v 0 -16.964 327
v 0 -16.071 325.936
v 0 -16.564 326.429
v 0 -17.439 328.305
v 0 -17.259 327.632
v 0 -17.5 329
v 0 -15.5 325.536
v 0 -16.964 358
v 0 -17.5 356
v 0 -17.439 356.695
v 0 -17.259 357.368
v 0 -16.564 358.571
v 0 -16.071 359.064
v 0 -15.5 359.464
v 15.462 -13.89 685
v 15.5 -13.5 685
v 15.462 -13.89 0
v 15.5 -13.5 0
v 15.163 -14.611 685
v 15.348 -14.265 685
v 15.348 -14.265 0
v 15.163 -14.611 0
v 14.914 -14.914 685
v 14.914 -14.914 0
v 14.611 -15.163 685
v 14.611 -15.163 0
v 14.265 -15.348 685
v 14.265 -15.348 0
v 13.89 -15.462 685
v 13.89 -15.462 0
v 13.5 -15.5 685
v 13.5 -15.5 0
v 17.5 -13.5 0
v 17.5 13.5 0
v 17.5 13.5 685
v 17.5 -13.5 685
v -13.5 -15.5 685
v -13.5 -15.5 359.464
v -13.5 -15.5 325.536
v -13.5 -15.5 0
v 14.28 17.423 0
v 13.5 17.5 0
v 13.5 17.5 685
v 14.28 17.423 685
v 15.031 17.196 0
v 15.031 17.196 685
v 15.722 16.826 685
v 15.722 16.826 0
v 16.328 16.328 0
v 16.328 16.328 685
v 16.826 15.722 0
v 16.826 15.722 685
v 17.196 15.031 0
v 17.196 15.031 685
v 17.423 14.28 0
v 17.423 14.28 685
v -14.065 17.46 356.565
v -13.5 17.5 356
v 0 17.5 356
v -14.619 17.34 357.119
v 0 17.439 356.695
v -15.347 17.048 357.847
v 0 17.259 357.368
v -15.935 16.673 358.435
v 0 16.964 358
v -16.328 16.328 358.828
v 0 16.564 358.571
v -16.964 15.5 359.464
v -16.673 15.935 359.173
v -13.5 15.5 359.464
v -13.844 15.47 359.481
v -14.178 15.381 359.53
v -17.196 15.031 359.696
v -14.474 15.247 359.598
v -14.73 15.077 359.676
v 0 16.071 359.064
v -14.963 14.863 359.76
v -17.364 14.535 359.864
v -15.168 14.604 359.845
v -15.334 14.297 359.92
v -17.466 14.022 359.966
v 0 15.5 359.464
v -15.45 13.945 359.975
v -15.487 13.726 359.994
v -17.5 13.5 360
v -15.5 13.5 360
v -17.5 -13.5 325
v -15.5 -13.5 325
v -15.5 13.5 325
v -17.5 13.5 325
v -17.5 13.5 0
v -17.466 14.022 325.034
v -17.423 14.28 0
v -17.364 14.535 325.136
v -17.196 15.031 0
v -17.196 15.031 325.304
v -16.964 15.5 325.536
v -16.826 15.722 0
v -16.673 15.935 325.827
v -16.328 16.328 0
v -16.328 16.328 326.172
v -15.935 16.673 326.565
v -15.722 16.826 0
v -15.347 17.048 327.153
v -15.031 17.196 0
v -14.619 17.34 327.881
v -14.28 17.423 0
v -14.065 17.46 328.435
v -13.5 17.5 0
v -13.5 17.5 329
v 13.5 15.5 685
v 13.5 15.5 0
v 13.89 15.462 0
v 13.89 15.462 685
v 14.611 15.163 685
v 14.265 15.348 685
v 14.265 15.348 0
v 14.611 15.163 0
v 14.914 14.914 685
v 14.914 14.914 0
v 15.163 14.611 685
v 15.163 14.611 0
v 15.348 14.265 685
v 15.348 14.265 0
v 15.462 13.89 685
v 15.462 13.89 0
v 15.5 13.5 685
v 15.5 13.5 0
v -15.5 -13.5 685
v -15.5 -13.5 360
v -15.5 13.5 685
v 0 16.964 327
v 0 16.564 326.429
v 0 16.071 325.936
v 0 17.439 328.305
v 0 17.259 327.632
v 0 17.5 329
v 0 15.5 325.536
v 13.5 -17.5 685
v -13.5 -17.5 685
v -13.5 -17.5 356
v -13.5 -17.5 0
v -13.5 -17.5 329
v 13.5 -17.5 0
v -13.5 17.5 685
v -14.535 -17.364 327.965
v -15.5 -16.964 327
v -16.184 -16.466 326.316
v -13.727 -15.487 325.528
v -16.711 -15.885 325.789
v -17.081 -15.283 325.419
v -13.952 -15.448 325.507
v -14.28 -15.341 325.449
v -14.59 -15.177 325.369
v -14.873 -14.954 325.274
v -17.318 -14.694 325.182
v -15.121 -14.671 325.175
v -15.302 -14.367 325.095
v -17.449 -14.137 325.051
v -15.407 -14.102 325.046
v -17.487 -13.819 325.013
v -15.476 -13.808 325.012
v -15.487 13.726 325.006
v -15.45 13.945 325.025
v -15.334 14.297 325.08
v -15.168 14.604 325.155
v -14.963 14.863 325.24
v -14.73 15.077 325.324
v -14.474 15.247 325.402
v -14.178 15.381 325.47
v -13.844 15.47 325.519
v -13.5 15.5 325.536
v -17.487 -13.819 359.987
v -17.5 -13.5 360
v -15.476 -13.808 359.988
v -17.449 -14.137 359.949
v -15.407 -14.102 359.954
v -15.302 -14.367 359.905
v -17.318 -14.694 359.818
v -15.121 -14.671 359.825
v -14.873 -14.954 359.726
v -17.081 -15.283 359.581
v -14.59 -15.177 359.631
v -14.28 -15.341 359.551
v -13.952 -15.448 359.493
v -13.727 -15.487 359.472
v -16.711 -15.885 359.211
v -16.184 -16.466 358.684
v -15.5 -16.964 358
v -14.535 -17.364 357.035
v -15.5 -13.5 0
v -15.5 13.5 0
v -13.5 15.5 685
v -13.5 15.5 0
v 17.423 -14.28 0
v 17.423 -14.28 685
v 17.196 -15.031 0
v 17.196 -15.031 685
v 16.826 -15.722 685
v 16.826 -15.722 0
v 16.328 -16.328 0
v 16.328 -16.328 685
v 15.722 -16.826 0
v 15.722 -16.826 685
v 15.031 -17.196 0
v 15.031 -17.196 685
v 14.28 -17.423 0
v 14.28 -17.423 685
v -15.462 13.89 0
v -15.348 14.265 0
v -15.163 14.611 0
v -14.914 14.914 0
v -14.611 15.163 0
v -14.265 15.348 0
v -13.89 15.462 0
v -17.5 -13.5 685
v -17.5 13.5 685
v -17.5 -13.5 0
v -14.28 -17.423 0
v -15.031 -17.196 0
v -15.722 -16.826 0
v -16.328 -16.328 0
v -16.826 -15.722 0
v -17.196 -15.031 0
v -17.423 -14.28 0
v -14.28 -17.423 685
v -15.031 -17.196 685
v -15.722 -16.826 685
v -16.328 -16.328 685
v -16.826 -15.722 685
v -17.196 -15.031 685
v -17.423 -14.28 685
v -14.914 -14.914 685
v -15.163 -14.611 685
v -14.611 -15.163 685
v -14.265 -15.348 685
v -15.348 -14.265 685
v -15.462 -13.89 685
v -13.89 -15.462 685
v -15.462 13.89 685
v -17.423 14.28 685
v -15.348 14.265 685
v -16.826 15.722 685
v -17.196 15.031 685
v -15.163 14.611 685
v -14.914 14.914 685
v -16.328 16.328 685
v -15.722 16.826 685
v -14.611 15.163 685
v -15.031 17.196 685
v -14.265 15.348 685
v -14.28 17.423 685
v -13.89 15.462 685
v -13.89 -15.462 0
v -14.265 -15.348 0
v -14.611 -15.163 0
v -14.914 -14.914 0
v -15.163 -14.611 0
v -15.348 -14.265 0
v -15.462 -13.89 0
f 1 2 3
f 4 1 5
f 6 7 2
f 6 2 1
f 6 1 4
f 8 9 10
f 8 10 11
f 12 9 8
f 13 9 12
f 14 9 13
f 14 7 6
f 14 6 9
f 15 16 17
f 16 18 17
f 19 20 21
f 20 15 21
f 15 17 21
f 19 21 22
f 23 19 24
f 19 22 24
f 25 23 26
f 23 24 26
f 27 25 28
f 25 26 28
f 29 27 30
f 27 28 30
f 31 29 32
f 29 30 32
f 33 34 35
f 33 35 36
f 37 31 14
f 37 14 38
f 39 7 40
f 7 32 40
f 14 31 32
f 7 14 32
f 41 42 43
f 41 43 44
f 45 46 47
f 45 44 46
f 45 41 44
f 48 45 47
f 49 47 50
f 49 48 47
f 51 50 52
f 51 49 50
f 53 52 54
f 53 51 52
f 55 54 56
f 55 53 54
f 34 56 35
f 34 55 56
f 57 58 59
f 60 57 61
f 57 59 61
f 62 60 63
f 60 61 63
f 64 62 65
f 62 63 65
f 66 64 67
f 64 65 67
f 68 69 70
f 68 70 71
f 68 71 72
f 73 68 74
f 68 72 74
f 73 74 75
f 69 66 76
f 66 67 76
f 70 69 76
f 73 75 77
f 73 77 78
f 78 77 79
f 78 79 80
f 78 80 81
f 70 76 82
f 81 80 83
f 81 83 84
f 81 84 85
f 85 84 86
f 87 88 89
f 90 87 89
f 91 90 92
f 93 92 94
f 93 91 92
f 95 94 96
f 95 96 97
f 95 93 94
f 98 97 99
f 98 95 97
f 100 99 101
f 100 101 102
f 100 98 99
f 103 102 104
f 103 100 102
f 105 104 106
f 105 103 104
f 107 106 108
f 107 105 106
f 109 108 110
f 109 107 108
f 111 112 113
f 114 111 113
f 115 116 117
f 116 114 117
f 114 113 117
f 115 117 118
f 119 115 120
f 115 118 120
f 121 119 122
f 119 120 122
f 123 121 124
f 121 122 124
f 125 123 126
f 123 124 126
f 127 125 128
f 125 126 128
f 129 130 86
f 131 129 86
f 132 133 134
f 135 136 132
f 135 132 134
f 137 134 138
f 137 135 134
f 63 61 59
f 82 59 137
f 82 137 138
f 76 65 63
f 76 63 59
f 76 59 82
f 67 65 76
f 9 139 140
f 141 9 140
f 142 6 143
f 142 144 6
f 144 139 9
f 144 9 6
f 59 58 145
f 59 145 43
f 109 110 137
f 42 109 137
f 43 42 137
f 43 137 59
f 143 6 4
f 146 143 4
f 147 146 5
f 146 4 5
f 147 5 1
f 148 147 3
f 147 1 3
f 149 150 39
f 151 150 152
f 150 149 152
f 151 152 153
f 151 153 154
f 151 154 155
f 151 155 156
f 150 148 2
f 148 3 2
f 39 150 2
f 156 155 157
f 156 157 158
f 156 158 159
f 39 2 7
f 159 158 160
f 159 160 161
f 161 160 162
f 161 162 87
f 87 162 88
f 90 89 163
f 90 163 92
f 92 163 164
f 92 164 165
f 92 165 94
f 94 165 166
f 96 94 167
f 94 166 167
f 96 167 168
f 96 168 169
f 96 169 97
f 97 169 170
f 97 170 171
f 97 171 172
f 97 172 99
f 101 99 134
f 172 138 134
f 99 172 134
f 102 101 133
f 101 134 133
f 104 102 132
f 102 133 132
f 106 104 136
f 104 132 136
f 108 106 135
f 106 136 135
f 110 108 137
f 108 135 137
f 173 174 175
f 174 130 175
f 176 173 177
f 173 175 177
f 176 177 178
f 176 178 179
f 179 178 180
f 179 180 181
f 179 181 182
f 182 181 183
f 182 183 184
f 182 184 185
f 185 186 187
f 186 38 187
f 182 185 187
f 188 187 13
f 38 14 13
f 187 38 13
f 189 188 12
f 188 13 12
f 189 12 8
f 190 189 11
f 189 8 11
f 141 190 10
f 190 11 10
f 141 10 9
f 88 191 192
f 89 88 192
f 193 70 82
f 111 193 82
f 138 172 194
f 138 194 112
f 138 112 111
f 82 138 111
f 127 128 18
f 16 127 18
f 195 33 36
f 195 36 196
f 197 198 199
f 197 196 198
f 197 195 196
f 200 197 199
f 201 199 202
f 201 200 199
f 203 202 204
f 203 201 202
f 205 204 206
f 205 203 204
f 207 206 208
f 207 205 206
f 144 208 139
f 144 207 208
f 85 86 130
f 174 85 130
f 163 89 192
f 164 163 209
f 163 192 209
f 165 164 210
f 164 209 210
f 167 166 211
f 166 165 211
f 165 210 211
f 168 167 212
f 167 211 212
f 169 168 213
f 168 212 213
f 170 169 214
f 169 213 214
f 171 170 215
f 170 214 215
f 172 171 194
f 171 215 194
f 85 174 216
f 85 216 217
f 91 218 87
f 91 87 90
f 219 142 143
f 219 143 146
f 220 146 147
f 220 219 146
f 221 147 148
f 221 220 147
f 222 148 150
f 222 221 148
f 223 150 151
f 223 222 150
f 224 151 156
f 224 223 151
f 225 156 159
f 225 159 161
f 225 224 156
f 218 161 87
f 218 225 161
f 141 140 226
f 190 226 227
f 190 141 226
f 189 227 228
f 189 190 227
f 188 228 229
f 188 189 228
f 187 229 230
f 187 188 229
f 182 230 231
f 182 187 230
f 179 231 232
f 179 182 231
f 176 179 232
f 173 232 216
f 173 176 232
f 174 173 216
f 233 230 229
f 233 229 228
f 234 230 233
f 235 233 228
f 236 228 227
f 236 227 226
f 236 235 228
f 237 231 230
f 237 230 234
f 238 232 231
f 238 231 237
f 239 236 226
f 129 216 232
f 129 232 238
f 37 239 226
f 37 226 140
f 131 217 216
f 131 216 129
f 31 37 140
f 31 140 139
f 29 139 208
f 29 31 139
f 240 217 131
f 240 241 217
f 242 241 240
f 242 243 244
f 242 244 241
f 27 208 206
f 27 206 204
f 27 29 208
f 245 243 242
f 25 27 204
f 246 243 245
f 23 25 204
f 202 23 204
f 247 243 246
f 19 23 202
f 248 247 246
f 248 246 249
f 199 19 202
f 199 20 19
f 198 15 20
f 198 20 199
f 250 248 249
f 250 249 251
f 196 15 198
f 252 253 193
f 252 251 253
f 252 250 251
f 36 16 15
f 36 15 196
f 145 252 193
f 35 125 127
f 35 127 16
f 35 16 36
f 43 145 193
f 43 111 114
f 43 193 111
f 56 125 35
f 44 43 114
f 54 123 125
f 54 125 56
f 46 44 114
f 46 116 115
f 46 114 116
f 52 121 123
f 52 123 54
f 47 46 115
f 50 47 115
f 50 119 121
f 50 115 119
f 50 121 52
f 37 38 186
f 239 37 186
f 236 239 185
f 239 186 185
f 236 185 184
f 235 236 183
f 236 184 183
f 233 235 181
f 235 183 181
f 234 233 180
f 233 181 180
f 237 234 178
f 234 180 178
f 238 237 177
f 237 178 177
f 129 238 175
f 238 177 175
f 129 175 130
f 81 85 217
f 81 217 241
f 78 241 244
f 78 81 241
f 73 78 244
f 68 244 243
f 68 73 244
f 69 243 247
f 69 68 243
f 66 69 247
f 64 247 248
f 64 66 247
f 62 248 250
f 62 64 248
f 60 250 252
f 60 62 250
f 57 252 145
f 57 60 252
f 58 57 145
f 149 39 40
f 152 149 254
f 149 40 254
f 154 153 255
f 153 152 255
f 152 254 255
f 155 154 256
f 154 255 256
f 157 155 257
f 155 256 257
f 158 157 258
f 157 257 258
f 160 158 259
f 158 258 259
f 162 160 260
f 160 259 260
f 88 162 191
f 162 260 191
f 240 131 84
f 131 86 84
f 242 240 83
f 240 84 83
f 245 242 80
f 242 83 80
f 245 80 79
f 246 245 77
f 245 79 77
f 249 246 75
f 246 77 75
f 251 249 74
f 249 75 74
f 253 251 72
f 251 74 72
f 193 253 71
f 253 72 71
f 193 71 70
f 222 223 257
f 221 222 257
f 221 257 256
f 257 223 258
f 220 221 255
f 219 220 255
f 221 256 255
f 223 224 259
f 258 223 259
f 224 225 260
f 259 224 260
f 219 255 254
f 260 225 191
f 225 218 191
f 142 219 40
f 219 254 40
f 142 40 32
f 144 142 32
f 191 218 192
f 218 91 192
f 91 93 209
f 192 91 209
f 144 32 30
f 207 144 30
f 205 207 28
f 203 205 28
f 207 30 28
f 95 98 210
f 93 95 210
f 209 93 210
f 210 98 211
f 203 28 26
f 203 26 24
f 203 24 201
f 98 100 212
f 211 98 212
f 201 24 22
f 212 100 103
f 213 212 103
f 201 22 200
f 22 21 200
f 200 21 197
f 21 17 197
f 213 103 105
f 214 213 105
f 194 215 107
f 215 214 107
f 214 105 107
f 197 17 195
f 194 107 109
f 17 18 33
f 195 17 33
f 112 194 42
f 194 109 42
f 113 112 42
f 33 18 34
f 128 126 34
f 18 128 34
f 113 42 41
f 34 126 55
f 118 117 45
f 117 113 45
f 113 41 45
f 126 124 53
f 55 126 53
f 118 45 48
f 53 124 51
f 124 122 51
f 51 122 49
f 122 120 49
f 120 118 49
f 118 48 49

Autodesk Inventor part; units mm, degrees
ref_plane "Start plane" through (0, 0, 0) normal (0, 0, 1) x (1, 0, 0)
ref_plane "End plane" through (0, 0, 685) normal (0, 0, 1) x (1, 0, 0)
sketch "Sketch" plane through (0, 0, 0) normal (0, 0, 1) x (1, 0, 0)
  line L0 (-17.5, -13.5) -> (-17.5, 13.5)
  line L1 (-13.5, 17.5) -> (13.5, 17.5)
  line L2 (17.5, 13.5) -> (17.5, -13.5)
  line L3 (13.5, -17.5) -> (-13.5, -17.5)
  arc A0 (-17.5, -13.5) -> (-13.5, -17.5) centre (-13.5, -13.5) ccw
  arc A1 (-13.5, 17.5) -> (-17.5, 13.5) centre (-13.5, 13.5) ccw
  arc A2 (17.5, 13.5) -> (13.5, 17.5) centre (13.5, 13.5) ccw
  arc A3 (13.5, -17.5) -> (17.5, -13.5) centre (13.5, -13.5) ccw
  arc A4 (-13.5, 15.5) -> (-15.5, 13.5) centre (-13.5, 13.5) ccw
  line L4 (-13.5, 15.5) -> (13.5, 15.5)
  arc A5 (15.5, 13.5) -> (13.5, 15.5) centre (13.5, 13.5) ccw
  line L5 (15.5, 13.5) -> (15.5, -13.5)
  arc A6 (13.5, -15.5) -> (15.5, -13.5) centre (13.5, -13.5) ccw
  line L6 (13.5, -15.5) -> (-13.5, -15.5)
  arc A7 (-15.5, -13.5) -> (-13.5, -15.5) centre (-13.5, -13.5) ccw
  line L7 (-15.5, -13.5) -> (-15.5, 13.5)
  line L8 (0, 25.6598) -> (0, -25.6598) construction
  line L9 (-25.6598, 0) -> (25.6598, 0) construction
  dimension "d7" = 4
  dimension "d10" = 35
  dimension "d11" = 35
  dimension "d12" = 2
  dimension "d15" = 17.5
  dimension "d16" = 17.5
extrude "Body" add sketch "Sketch" along normal up to surface (685 mm away) from surface at 0
sketch "Sketch3" plane through (0, 0, 0) normal (0, 0, 1) x (1, 0, 0)
  line L0 (0, 0) -> (10, 0)
ref_plane "Work Plane3" through (0, 0, 0) normal (0, -1, 0) x (1, 0, 0)
sketch "Sketch4" plane through (0, 0, 0) normal (0, -1, 0) x (1, 0, 0)
  line L0 (-2, 0) -> (12, 0)
  line L1 (-2, 685) -> (12, 685)
  dimension "d18" = 685
ref_plane "Work Plane4" through (0, 0, 342.5) normal (-1, 0, 0) x (0, 0, 1)
ref_plane "Work Plane5" through (-395, 0, 342.5) normal (-1, 0, 0) x (0, 0, 1)
ref_plane "Work Plane6" through (-197.5, 0, 342.5) normal (-1, 0, 0) x (0, 0, 1)
sketch "Sketch5" plane through (-197.5, 0, 342.5) normal (-1, 0, 0) x (0, 0, 1)
  arc A0 (-17.5, -13.5) -> (-13.5, -17.5) centre (-13.5, -13.5) ccw
  line L0 (-17.5, -13.5) -> (-17.5, 13.5)
  arc A1 (-13.5, 17.5) -> (-17.5, 13.5) centre (-13.5, 13.5) ccw
  line L1 (-13.5, 17.5) -> (13.5, 17.5)
  arc A2 (17.5, 13.5) -> (13.5, 17.5) centre (13.5, 13.5) ccw
  line L2 (17.5, 13.5) -> (17.5, -13.5)
  arc A3 (13.5, -17.5) -> (17.5, -13.5) centre (13.5, -13.5) ccw
  line L3 (13.5, -17.5) -> (-13.5, -17.5)
  arc A4 (-13.5, 15.5) -> (-15.5, 13.5) centre (-13.5, 13.5) ccw
  line L4 (-13.5, 15.5) -> (13.5, 15.5)
  arc A5 (15.5, 13.5) -> (13.5, 15.5) centre (13.5, 13.5) ccw
  line L5 (15.5, 13.5) -> (15.5, -13.5)
  arc A6 (13.5, -15.5) -> (15.5, -13.5) centre (13.5, -13.5) ccw
  line L6 (13.5, -15.5) -> (-13.5, -15.5)
  arc A7 (-15.5, -13.5) -> (-13.5, -15.5) centre (-13.5, -13.5) ccw
  line L7 (-15.5, -13.5) -> (-15.5, 13.5)
extrude "Extrusion2" cut sketch "Sketch5" along normal up to surface (395 mm away) from surface at -197.5 contours L0 A1 L1 A2 L2 A3 L3 A0 | L4 A5 L5 A6 L6 A7 L7 A4
equation "\"d7\" = G_IR"
equation "\"d10\" = G_H"
equation "\"d11\" = G_W"
equation "\"d12\" = G_T"
equation "\"d15\" = 0.5 * d10"
equation "\"d16\" = 0.5 * d11"
equation "\"d3\" = G_L"
equation "\"G_W\" = 35"
equation "\"G_H\" = 35"
equation "\"G_T\" = 2"
equation "\"G_IR\" = 4"
equation "\"G_L\" = d18"
equation "\"G_OFFSET_START\" = 0"
equation "\"G_OFFSET_END\" = 0"
equation "\"d14\" = G_OFFSET_END + B_L"
equation "\"B_L\" = 685"
properties part number "AS 1163 - C350L0 35x35x2.0 SHS - 685" material "Steel, Mild"
